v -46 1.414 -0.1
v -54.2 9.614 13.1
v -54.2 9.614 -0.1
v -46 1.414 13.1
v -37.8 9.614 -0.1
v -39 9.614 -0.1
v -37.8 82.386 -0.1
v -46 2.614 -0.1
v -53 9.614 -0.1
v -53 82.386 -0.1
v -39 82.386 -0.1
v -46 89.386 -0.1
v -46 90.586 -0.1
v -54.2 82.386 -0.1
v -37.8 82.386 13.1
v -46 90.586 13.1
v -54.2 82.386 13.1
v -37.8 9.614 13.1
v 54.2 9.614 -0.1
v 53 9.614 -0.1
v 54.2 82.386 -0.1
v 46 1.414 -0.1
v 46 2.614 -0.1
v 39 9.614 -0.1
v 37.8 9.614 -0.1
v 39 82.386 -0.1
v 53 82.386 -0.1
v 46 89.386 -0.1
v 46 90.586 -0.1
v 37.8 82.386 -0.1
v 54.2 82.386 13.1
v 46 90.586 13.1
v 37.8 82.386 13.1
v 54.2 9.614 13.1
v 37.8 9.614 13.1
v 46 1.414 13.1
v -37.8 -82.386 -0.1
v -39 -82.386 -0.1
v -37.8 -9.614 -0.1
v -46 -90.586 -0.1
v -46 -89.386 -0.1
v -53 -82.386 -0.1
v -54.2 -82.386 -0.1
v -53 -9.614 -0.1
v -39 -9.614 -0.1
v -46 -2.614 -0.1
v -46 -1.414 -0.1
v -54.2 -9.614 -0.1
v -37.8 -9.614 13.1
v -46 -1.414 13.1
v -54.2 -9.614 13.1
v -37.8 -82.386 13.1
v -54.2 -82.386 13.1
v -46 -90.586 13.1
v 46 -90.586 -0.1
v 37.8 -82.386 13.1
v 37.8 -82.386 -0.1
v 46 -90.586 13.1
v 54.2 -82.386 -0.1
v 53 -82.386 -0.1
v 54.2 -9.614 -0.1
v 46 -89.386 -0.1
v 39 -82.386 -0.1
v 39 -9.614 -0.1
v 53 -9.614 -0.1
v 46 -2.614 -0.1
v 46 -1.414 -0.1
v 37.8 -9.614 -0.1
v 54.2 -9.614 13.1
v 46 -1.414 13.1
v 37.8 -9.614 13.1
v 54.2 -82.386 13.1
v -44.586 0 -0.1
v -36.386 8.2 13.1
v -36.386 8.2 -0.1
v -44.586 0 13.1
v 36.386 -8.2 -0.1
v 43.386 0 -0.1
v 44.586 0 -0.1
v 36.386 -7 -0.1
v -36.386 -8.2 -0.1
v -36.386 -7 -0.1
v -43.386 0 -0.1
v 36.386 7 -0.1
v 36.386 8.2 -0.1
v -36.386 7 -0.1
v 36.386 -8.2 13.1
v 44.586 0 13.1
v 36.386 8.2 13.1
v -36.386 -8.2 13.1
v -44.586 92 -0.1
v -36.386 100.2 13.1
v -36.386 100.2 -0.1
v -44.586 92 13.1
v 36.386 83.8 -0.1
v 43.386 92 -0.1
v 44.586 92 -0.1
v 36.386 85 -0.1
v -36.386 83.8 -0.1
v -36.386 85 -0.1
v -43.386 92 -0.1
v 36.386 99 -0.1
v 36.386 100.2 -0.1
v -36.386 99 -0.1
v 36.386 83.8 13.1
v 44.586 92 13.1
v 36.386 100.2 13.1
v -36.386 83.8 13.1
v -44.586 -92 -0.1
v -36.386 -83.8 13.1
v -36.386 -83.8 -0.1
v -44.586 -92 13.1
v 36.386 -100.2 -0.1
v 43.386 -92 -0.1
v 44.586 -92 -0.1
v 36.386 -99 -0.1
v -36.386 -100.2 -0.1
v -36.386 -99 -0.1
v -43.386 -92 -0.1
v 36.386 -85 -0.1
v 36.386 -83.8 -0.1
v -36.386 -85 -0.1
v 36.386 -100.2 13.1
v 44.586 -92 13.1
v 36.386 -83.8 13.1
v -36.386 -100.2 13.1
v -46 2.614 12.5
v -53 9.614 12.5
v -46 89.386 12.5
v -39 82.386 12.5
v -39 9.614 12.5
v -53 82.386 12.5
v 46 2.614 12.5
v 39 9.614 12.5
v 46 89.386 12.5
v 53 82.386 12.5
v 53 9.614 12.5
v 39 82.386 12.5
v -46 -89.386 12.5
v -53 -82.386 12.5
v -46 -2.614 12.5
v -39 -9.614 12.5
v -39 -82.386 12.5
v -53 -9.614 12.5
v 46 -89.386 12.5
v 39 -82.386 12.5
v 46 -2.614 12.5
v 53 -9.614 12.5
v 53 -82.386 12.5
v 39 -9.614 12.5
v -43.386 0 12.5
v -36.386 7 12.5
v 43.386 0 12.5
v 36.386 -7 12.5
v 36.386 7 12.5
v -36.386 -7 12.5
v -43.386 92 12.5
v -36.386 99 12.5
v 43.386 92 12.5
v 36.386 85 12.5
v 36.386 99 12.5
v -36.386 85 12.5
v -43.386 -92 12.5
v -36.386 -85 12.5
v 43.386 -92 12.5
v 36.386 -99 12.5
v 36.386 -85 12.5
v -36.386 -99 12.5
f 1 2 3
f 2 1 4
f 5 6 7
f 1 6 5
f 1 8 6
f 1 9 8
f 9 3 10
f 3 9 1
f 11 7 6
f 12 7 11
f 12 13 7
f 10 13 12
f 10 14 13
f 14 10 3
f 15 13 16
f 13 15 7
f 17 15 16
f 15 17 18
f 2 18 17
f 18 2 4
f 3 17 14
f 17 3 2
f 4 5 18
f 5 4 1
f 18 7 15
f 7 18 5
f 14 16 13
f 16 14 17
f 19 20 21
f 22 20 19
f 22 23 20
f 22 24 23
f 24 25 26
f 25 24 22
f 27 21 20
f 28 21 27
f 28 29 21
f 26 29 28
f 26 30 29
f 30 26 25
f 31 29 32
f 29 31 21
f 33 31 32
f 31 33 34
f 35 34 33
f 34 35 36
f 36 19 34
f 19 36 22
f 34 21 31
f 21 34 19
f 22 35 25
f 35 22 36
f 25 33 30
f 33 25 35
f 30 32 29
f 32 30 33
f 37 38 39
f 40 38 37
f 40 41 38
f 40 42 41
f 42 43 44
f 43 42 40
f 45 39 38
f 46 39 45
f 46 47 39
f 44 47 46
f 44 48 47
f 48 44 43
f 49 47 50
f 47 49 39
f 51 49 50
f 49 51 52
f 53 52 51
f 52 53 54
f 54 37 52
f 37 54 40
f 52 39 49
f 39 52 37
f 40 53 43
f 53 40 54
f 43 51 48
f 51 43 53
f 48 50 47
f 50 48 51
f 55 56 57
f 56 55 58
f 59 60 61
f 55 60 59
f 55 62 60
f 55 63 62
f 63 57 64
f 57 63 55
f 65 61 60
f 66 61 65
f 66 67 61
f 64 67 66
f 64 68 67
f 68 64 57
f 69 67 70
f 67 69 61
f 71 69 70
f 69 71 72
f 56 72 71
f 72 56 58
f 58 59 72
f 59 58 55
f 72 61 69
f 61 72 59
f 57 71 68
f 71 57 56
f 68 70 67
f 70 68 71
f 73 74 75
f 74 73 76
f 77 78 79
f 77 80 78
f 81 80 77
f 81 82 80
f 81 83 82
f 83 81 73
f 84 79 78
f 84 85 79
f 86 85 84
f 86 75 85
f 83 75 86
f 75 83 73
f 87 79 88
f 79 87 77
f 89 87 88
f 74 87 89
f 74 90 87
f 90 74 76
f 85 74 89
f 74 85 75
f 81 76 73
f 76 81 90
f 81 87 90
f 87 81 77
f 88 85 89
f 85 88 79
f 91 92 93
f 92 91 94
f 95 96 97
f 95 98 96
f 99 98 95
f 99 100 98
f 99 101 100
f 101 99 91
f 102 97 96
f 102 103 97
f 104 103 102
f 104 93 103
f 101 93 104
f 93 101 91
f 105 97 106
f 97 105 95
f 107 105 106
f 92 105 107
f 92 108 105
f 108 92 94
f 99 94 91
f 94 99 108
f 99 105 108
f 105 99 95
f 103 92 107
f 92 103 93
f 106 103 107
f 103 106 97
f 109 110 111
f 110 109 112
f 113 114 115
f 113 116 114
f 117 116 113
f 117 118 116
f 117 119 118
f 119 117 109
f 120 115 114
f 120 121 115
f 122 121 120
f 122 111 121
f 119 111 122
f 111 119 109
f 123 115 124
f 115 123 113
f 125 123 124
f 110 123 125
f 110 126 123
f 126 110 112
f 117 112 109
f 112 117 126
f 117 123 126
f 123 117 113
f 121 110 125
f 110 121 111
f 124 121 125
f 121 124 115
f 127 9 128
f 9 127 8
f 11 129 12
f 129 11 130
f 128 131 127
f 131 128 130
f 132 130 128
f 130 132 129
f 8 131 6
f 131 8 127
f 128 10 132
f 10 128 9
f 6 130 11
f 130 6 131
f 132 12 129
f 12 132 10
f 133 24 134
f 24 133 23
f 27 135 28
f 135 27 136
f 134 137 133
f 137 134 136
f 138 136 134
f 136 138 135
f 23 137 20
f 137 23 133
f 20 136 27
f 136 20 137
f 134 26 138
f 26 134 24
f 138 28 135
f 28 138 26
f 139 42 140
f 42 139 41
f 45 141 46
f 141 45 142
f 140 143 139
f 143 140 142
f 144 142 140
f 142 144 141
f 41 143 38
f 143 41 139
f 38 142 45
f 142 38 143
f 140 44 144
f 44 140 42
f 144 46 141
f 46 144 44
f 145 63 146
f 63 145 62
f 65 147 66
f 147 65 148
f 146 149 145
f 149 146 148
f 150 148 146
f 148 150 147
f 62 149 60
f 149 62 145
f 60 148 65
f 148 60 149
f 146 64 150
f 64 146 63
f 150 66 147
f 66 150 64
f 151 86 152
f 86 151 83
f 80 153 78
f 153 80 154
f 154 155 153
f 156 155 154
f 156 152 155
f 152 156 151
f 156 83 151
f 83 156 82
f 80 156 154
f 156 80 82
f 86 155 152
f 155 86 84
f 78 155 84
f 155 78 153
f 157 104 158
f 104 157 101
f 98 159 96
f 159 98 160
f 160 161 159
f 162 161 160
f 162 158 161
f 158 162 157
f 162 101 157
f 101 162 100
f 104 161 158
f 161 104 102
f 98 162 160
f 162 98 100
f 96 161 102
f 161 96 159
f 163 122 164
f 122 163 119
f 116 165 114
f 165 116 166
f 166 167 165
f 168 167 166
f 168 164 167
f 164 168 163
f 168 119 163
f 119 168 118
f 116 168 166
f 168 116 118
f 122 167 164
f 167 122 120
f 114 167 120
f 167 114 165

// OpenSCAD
// file: 7segment_lightguide.scad
// Modular 7-Segment Lightguide / Diffuser (Parametric)
// Solid continuous reflector walls (No wire/connector cutouts)
// Optimized for maximum brightness: 0.6mm and 0.8mm top diffuser layer variants

// --- Configuration Parameter ---
diffuser_thick = 0.6; // [0.6: High Brightness (0.6mm), 0.8: Balanced (0.8mm), 1.0: Standard (1.0mm)]

total_depth = 13.0;   // Matches frontplate housing depth (13.0 mm)
tunnel_depth = total_depth - diffuser_thick; // Inner cavity depth (12.4mm for 0.6, 12.2mm for 0.8)

// --- Dimensions (matching 7segment_pogo / 7segment_v1) ---
pitch_x = 92;
pitch_y_top = 92;
pitch_y_bot = 92;
strip_width = 12;
white_wall = 1.2;
front_wall = 2.0;

diffuser_w = strip_width + 2;               // 14 mm
total_seg_w = diffuser_w + white_wall * 2;  // 16.4 mm

total_seg_l_x = pitch_x - front_wall * 1.4142;
total_seg_l_y_top = pitch_y_top - front_wall * 1.4142;
total_seg_l_y_bot = pitch_y_bot - front_wall * 1.4142;
diffuser_l_x = total_seg_l_x - white_wall * 2;
diffuser_l_y_top = total_seg_l_y_top - white_wall * 2;
diffuser_l_y_bot = total_seg_l_y_bot - white_wall * 2;

// --- Shapes & Helpers ---
module segment_shape(l, w, h) {
    translate([0, 0, -0.1])
    linear_extrude(height = h + 0.2)
    polygon([
        [-l/2 + w/2, -w/2],
        [l/2 - w/2, -w/2],
        [l/2, 0],
        [l/2 - w/2, w/2],
        [-l/2 + w/2, w/2],
        [-l/2, 0]
    ]);
}

module layout_horiz(is_top=false, is_bot=false) {
    if (is_top) {
        translate([0, pitch_y_top, 0]) children();
    } else if (is_bot) {
        translate([0, -pitch_y_bot, 0]) children();
    } else {
        translate([0, 0, 0]) children();
    }
}

module layout_vert(is_top=false) {
    if (is_top) {
        translate([-pitch_x/2, pitch_y_top/2, 0]) rotate([0, 0, 90]) children();
        translate([pitch_x/2, pitch_y_top/2, 0]) rotate([0, 0, 90]) children();
    } else {
        translate([-pitch_x/2, -pitch_y_bot/2, 0]) rotate([0, 0, 90]) children();
        translate([pitch_x/2, -pitch_y_bot/2, 0]) rotate([0, 0, 90]) children();
    }
}

module frontplate_white(d_thick = diffuser_thick) {
    t_depth = total_depth - d_thick;
    difference() {
        // Outer white reflector walls + top diffuser (Total depth = 13.0 mm)
        union() {
            layout_horiz(false, false) segment_shape(total_seg_l_x, total_seg_w, total_depth);
            layout_horiz(true, false) segment_shape(total_seg_l_x, total_seg_w, total_depth);
            layout_horiz(false, true) segment_shape(total_seg_l_x, total_seg_w, total_depth);
            layout_vert(true) segment_shape(total_seg_l_y_top, total_seg_w, total_depth);
            layout_vert(false) segment_shape(total_seg_l_y_bot, total_seg_w, total_depth);
        }
            
        // Hollow light tunnel cavity, leaving d_thick solid diffuser face on top
        layout_horiz(false, false) segment_shape(diffuser_l_x, diffuser_w, t_depth);
        layout_horiz(true, false) segment_shape(diffuser_l_x, diffuser_w, t_depth);
        layout_horiz(false, true) segment_shape(diffuser_l_x, diffuser_w, t_depth);
        layout_vert(true) segment_shape(diffuser_l_y_top, diffuser_w, t_depth);
        layout_vert(false) segment_shape(diffuser_l_y_bot, diffuser_w, t_depth);
    }
}

// Default render
color("White") frontplate_white(diffuser_thick);
// main file
// 7-Segment Lightguide / Diffuser - 0.6 mm Variant
// High brightness / maximum light transmission variant
include <7segment_lightguide.scad>
frontplate_white(d_thick = 0.6);
